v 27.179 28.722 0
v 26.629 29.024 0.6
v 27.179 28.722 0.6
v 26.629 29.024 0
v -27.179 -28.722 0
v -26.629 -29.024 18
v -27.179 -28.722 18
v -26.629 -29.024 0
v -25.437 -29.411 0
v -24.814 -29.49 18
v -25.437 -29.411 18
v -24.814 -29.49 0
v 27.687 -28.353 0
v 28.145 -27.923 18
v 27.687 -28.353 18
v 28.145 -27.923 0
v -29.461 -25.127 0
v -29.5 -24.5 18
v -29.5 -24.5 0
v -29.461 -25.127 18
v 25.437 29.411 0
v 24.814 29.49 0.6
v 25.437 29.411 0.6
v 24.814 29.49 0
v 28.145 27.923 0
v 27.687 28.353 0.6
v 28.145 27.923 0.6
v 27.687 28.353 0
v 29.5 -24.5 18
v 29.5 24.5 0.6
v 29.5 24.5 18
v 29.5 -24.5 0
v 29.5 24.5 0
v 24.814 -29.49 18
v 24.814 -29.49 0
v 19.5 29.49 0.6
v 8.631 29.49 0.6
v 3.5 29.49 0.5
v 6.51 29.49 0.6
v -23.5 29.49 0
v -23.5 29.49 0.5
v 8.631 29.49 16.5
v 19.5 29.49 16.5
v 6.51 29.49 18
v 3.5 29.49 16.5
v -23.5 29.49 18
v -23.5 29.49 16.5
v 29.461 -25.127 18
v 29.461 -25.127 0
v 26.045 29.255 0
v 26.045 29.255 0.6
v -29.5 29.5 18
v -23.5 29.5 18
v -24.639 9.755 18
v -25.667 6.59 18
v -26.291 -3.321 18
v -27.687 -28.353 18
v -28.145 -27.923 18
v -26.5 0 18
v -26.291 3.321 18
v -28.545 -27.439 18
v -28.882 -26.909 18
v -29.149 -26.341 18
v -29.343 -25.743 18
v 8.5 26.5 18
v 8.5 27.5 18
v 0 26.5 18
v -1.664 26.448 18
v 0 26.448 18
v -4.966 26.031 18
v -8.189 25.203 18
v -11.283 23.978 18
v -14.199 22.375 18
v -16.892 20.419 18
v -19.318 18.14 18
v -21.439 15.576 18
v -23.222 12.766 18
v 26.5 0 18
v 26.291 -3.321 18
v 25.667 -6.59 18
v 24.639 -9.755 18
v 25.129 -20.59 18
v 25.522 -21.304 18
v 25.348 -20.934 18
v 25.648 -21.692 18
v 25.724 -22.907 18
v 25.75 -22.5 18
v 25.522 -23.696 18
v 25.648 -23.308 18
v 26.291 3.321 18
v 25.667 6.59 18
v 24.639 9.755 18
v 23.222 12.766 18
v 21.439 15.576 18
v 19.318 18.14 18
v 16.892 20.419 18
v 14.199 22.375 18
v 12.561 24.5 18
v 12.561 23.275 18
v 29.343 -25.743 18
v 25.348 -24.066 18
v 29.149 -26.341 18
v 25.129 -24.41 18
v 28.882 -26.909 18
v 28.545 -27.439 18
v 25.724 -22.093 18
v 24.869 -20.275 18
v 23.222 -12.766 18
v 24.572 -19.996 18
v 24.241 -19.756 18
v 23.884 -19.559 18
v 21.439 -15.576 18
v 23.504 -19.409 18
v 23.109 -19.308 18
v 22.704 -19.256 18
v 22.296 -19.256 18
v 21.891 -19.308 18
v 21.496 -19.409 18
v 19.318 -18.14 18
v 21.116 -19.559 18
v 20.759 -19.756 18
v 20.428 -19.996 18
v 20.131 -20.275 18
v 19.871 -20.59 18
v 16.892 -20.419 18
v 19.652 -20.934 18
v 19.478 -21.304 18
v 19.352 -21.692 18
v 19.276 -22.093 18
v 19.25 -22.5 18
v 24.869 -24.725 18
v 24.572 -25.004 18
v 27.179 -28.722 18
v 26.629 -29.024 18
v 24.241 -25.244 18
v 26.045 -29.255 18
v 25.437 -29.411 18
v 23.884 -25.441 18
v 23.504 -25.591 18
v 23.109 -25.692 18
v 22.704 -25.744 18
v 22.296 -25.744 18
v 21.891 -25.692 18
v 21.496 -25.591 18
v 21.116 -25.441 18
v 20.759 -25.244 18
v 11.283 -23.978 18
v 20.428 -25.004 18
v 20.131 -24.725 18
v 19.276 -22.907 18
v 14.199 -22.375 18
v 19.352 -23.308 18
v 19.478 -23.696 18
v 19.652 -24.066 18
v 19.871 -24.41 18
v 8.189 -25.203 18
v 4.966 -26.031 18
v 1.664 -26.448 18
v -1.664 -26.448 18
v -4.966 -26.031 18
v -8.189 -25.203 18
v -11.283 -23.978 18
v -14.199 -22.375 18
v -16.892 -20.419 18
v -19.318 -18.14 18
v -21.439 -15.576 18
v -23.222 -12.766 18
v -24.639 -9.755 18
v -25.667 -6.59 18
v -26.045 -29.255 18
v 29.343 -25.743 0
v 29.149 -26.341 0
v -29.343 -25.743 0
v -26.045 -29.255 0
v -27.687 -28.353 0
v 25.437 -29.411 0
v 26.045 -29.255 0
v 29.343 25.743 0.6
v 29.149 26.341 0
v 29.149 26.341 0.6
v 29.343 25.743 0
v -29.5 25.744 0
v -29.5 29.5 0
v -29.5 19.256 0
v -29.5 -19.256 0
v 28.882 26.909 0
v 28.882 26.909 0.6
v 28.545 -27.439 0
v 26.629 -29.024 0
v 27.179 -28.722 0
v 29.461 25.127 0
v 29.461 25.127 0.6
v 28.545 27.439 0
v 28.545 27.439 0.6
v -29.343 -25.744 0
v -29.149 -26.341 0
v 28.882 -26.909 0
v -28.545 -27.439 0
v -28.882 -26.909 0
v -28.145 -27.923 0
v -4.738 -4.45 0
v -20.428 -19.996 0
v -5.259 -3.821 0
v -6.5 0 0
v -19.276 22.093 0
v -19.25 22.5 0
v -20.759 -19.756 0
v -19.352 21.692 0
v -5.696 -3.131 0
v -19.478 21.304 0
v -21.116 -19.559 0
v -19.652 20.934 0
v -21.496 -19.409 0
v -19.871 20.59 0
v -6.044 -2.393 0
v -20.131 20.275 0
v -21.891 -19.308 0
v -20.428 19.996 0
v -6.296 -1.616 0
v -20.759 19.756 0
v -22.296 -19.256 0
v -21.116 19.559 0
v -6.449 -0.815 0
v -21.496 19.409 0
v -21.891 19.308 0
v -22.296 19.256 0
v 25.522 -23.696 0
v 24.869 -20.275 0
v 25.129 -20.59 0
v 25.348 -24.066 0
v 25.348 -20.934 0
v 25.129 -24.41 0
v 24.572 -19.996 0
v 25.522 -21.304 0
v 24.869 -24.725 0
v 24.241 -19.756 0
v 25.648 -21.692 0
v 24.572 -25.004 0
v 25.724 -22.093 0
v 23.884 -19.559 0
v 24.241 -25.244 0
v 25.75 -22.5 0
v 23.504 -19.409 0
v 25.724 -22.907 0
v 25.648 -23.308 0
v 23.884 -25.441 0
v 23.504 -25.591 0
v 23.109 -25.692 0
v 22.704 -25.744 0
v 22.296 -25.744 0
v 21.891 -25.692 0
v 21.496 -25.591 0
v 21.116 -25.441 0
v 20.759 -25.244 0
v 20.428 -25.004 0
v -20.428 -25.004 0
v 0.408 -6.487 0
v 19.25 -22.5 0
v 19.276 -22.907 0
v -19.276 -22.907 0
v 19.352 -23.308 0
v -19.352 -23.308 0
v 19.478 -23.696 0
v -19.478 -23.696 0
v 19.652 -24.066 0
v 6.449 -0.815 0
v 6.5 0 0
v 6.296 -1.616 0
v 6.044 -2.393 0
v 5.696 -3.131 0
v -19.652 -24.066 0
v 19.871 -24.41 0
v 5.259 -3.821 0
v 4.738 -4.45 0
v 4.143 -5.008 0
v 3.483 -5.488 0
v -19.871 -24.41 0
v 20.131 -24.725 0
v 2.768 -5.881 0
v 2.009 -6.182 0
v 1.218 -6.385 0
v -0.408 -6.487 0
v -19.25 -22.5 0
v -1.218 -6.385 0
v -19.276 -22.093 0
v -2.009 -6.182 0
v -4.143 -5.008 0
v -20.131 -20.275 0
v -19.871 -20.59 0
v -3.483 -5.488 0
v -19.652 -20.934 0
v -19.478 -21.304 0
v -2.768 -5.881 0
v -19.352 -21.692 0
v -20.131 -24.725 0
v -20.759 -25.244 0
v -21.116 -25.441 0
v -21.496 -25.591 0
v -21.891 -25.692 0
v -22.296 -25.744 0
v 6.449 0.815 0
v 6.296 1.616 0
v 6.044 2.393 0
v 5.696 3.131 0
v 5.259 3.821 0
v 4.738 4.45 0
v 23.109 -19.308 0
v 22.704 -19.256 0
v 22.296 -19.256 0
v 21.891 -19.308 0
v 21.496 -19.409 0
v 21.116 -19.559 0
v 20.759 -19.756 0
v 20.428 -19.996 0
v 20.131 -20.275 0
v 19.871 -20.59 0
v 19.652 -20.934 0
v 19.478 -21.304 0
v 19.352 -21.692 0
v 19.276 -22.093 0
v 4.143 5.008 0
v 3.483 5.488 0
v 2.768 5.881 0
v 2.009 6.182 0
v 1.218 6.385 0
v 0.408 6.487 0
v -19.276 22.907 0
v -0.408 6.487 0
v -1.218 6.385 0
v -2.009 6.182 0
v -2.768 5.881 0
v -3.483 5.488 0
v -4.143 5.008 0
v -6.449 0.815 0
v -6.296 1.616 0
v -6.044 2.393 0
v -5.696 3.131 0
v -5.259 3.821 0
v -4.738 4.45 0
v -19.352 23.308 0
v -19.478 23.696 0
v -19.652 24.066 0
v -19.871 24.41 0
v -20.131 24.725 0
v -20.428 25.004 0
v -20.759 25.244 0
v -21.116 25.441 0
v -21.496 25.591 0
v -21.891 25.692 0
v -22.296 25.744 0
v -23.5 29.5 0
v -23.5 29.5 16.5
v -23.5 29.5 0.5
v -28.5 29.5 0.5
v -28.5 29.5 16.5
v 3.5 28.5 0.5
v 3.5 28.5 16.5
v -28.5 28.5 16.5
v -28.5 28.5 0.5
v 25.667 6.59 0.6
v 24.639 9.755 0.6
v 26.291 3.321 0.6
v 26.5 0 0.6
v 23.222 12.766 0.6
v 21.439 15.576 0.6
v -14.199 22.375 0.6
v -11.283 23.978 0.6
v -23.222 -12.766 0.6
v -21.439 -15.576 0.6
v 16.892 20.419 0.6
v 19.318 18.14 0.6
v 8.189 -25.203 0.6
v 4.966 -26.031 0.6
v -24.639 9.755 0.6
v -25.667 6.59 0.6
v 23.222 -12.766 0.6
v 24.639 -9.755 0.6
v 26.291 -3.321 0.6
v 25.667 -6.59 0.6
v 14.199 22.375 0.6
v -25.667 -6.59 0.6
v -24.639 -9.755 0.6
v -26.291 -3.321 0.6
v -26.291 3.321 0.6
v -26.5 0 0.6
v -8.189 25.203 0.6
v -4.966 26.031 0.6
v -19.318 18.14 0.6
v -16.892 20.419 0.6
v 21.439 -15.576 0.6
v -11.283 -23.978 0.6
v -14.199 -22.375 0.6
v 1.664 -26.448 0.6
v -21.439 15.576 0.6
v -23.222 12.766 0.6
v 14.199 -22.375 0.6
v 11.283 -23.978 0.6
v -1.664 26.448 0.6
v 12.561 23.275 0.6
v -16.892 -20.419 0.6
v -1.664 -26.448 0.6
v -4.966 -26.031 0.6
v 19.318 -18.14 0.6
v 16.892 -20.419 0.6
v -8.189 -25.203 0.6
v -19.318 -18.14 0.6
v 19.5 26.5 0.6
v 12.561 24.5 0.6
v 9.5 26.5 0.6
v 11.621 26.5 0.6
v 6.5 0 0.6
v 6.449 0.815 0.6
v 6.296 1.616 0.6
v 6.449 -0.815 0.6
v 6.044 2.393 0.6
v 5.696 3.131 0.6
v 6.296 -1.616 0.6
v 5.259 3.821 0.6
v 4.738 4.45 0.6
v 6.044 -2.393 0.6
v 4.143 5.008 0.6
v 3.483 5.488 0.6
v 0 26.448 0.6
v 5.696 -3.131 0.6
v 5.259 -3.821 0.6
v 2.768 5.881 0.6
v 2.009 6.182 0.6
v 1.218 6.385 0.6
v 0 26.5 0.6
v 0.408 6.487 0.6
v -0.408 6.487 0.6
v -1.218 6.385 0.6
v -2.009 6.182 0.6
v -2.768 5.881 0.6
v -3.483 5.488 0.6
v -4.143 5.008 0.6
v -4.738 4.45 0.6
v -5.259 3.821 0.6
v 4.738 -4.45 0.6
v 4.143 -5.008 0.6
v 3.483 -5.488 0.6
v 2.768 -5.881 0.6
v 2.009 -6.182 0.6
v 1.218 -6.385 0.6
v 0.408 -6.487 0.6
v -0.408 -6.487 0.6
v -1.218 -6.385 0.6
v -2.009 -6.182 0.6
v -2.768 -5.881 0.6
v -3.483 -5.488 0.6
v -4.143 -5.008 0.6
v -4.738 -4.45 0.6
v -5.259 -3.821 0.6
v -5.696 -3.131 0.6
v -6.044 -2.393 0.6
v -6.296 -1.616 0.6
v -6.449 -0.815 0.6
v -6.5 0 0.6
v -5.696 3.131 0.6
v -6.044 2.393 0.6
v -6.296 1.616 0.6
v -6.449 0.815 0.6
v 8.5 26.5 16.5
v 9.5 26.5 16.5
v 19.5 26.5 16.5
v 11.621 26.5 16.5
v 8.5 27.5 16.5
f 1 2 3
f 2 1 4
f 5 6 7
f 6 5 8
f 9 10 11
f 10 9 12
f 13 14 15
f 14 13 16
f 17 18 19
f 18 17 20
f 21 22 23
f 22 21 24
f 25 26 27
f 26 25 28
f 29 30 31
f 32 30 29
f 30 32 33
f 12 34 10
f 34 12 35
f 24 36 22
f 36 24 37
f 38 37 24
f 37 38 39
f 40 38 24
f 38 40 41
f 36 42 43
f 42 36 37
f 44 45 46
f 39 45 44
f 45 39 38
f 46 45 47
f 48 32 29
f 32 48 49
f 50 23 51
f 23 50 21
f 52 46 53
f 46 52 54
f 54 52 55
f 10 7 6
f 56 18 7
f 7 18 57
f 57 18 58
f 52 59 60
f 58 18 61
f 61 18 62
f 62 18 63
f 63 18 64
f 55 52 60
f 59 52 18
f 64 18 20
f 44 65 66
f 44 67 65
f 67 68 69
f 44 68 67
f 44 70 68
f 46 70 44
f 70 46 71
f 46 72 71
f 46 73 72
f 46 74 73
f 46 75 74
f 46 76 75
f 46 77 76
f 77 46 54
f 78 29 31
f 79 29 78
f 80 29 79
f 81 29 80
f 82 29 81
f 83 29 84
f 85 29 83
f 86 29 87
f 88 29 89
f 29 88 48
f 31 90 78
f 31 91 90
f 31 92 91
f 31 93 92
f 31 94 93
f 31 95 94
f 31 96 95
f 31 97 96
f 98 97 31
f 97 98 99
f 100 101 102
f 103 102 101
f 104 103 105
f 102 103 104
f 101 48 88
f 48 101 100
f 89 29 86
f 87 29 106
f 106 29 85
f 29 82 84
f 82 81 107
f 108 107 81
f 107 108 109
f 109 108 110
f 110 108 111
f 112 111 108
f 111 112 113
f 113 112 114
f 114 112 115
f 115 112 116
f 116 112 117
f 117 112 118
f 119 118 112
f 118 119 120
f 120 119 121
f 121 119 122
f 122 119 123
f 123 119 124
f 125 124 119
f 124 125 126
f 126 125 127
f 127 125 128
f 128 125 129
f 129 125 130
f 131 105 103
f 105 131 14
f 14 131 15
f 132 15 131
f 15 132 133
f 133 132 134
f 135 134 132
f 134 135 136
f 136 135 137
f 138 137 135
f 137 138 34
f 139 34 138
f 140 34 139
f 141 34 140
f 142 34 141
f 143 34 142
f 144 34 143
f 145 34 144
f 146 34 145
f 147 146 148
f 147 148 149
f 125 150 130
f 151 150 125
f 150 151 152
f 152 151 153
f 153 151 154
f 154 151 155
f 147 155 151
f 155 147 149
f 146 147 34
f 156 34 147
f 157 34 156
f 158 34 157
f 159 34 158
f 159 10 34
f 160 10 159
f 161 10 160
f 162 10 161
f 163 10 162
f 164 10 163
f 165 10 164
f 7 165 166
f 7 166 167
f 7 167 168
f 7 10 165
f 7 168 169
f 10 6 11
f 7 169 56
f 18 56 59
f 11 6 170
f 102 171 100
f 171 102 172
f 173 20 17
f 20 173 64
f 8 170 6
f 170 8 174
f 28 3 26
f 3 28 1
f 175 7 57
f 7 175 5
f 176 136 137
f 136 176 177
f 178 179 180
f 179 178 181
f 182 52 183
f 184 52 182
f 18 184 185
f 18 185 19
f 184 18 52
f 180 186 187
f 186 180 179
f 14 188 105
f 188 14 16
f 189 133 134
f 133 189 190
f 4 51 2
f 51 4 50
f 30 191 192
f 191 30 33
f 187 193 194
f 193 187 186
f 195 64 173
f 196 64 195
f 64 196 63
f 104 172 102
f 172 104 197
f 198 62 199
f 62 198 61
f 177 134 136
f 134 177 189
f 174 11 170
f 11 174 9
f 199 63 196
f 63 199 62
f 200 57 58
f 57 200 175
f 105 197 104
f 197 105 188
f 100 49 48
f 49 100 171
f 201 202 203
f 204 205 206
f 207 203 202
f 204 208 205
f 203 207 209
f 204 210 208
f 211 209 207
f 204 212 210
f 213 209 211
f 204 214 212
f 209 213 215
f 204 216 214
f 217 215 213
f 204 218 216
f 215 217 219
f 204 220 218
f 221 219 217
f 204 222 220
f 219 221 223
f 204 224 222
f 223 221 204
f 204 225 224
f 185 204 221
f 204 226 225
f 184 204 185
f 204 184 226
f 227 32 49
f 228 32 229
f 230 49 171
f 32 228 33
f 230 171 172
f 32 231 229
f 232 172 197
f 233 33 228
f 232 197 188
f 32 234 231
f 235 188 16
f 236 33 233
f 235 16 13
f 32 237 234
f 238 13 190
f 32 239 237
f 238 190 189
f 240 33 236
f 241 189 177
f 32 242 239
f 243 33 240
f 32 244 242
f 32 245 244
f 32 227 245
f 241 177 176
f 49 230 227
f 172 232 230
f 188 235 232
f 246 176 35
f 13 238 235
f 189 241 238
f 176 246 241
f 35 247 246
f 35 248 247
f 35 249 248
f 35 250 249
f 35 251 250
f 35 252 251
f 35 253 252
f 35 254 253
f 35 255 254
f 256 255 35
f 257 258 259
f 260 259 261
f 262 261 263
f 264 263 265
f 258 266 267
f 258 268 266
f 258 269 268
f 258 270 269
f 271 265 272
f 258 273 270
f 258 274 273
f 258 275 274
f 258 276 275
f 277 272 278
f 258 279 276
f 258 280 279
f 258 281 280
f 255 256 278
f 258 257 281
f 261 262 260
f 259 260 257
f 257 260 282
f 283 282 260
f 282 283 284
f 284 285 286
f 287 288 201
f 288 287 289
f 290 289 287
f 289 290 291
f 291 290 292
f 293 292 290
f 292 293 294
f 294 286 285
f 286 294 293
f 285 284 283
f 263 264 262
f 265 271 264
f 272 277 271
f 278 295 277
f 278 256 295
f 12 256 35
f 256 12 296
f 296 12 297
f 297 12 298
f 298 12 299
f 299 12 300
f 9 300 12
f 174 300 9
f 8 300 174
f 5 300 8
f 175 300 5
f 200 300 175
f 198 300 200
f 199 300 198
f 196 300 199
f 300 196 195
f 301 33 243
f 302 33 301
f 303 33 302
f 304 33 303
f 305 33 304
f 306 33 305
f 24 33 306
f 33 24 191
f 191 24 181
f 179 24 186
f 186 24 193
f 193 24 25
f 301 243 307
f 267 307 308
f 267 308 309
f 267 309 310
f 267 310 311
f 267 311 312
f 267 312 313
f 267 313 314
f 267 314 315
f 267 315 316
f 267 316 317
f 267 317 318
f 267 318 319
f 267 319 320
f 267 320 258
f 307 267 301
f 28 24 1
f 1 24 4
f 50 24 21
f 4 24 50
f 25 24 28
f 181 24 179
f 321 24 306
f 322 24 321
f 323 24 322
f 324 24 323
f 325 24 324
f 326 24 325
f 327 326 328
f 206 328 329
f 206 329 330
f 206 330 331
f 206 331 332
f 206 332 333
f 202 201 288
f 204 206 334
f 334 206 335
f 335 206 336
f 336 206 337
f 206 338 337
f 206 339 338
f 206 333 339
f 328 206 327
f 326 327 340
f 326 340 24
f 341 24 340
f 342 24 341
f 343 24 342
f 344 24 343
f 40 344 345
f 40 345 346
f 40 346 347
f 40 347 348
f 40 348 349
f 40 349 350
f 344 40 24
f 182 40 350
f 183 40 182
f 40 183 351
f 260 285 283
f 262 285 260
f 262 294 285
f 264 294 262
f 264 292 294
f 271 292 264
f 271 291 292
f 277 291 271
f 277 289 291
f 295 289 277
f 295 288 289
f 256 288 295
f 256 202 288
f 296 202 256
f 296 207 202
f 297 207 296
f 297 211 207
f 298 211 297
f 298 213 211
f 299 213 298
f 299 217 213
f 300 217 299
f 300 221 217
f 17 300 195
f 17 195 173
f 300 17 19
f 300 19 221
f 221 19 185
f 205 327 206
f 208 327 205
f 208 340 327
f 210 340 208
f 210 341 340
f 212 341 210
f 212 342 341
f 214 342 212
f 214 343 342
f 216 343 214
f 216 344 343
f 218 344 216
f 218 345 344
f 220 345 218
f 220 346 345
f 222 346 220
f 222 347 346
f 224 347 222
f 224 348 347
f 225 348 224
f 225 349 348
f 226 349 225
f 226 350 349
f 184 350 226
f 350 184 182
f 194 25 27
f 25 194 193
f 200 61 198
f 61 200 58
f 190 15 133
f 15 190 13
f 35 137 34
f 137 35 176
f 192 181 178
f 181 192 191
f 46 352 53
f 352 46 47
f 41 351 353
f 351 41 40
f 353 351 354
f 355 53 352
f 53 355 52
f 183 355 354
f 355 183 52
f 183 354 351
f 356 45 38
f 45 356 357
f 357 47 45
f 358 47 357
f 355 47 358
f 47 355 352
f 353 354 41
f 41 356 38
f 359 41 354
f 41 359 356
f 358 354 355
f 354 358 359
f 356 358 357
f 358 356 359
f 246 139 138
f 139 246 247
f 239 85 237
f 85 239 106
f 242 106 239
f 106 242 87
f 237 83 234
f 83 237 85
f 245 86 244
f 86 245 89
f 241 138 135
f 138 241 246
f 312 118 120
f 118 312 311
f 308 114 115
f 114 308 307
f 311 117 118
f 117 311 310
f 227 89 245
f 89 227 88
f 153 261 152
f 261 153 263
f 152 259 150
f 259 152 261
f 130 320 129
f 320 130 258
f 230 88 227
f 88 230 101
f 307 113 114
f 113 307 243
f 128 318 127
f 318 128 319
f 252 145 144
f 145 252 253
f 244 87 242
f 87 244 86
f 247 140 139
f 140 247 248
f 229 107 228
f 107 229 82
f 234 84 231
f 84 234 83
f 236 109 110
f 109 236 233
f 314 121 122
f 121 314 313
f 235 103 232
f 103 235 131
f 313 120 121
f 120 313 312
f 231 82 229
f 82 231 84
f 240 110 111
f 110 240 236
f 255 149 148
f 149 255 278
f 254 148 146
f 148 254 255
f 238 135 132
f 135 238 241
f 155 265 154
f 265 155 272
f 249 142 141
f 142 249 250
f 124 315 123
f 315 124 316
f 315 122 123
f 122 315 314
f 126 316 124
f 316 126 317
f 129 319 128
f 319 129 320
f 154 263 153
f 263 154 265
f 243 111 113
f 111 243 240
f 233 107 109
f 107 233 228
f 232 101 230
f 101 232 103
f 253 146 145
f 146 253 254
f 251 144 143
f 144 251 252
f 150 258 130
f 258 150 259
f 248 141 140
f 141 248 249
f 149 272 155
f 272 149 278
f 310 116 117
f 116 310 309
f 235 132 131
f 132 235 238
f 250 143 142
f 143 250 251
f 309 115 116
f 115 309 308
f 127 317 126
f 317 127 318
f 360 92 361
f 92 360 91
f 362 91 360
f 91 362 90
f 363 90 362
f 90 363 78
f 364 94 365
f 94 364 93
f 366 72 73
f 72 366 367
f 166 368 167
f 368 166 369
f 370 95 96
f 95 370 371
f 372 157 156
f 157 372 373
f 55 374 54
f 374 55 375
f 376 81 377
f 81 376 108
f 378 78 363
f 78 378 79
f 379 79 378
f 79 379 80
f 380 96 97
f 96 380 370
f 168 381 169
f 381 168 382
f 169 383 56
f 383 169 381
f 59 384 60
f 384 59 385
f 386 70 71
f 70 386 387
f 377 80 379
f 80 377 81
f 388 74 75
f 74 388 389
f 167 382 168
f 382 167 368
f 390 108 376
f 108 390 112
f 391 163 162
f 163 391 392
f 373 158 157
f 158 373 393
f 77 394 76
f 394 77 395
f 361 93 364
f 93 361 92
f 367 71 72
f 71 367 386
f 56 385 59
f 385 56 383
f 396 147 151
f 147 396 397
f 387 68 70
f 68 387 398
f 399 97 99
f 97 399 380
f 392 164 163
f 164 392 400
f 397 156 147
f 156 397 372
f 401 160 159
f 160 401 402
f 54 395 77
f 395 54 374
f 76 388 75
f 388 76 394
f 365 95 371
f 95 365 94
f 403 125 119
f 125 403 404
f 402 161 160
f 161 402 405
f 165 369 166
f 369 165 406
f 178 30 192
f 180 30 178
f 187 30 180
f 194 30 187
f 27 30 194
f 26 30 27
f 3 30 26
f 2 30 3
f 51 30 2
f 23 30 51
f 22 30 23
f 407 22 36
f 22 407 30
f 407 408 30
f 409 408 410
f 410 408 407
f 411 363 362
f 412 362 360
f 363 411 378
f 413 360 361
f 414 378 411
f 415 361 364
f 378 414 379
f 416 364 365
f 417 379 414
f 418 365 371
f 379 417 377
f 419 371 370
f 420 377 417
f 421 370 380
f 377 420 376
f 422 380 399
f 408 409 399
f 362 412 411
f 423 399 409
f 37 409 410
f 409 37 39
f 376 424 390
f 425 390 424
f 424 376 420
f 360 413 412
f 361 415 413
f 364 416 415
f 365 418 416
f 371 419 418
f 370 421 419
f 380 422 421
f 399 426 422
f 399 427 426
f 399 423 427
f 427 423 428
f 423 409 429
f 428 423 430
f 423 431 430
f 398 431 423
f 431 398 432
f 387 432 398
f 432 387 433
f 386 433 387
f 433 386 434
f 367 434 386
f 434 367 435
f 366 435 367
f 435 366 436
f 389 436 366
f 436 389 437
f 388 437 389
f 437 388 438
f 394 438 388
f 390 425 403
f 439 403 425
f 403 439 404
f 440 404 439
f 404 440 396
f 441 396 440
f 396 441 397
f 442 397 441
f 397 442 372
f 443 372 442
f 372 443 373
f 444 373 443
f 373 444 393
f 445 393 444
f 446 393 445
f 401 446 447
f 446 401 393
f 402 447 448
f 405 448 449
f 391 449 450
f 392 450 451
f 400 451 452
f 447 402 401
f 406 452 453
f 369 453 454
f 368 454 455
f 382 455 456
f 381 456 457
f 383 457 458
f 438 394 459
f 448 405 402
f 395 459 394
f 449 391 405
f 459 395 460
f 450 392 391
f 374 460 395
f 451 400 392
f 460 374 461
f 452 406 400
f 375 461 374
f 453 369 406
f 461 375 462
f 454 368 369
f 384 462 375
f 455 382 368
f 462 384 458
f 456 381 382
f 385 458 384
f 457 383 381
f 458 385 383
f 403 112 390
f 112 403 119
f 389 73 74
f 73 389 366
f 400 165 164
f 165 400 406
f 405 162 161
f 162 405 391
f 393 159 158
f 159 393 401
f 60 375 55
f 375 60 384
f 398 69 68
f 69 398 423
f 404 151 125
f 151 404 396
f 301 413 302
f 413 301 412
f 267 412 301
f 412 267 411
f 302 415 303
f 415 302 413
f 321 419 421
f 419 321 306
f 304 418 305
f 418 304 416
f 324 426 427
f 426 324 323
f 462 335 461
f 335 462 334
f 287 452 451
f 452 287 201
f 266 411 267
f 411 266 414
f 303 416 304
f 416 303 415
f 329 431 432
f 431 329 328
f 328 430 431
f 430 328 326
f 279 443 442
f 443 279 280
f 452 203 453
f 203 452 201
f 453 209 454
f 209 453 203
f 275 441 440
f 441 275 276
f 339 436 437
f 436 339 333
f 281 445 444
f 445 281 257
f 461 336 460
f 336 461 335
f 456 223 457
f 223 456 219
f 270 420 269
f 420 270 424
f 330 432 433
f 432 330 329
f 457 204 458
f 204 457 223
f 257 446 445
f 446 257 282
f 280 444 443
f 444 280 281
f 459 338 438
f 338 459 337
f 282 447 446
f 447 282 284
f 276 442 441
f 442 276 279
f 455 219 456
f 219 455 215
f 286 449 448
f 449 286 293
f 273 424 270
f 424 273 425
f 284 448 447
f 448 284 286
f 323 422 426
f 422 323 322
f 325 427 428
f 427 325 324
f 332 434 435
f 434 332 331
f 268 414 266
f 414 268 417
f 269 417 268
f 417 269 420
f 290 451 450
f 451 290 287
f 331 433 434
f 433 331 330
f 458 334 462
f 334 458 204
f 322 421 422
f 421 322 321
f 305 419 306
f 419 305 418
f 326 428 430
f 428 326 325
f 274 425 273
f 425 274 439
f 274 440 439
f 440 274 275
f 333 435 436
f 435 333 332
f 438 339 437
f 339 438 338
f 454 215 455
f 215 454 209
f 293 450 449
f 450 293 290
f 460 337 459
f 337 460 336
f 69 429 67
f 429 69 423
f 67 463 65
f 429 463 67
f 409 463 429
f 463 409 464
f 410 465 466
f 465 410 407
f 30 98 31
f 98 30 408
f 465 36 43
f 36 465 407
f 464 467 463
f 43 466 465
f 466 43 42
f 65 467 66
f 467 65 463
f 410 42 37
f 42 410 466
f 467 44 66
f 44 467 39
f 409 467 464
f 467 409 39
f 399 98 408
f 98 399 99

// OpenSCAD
$fn = 50;


difference() {
	union() {
		hull() {
			translate(v = [-24.5000000000, 24.5000000000, 0]) {
				cylinder(h = 18, r = 5);
			}
			translate(v = [24.5000000000, 24.5000000000, 0]) {
				cylinder(h = 18, r = 5);
			}
			translate(v = [-24.5000000000, -24.5000000000, 0]) {
				cylinder(h = 18, r = 5);
			}
			translate(v = [24.5000000000, -24.5000000000, 0]) {
				cylinder(h = 18, r = 5);
			}
		}
		translate(v = [-29.5000000000, 23.5000000000, 0]) {
			cube(size = [6, 6, 18]);
		}
	}
	union() {
		translate(v = [-30.0000000000, -22.5000000000, -250.0000000000]) {
			rotate(a = [0, 0, 0]) {
				difference() {
					union() {
						hull() {
							translate(v = [7.5000000000, 0, 0]) {
								cylinder(h = 250, r = 3.2500000000, r1 = 3.2500000000, r2 = 3.2500000000);
							}
							translate(v = [-7.5000000000, 0, 0]) {
								cylinder(h = 250, r = 3.2500000000, r1 = 3.2500000000, r2 = 3.2500000000);
							}
						}
					}
					union();
				}
			}
		}
		translate(v = [-30.0000000000, 22.5000000000, -250.0000000000]) {
			rotate(a = [0, 0, 0]) {
				difference() {
					union() {
						hull() {
							translate(v = [7.5000000000, 0, 0]) {
								cylinder(h = 250, r = 3.2500000000, r1 = 3.2500000000, r2 = 3.2500000000);
							}
							translate(v = [-7.5000000000, 0, 0]) {
								cylinder(h = 250, r = 3.2500000000, r1 = 3.2500000000, r2 = 3.2500000000);
							}
						}
					}
					union();
				}
			}
		}
		translate(v = [-28.5000000000, 28.5000000000, 0.5000000000]) {
			cube(size = [32, 1, 16]);
		}
		translate(v = [22.5000000000, -22.5000000000, -50.0000000000]) {
			cylinder(h = 100, r = 3.2500000000);
		}
		translate(v = [0, 0, 0.6000000000]) {
			cylinder(h = 20.4000000000, r = 26.5000000000);
		}
		translate(v = [0, 0, -9.0000000000]) {
			cylinder(h = 18, r = 6.5000000000);
		}
		translate(v = [0.0000000000, 24.5000000000, 0.6000000000]) {
			cube(size = [29.5000000000, 2, 20.4000000000]);
		}
		translate(v = [19.5000000000, 24.5000000000, 0.6000000000]) {
			cube(size = [10, 5, 20.4000000000]);
		}
		translate(v = [8.5000000000, 24.5000000000, 16.5000000000]) {
			cube(size = [21, 5, 1.5000000000]);
		}
		translate(v = [5.7500000000, 30.2500000000, 0.6000000000]) {
			rotate(a = [0, 0, -45]) {
				cube(size = [7.5000000000, 1.5000000000, 20.4000000000]);
			}
		}
		translate(v = [5.0610000000, 22.5000000000, 0.6000000000]) {
			cube(size = [7.5000000000, 2, 17.4000000000]);
		}
	}
}
